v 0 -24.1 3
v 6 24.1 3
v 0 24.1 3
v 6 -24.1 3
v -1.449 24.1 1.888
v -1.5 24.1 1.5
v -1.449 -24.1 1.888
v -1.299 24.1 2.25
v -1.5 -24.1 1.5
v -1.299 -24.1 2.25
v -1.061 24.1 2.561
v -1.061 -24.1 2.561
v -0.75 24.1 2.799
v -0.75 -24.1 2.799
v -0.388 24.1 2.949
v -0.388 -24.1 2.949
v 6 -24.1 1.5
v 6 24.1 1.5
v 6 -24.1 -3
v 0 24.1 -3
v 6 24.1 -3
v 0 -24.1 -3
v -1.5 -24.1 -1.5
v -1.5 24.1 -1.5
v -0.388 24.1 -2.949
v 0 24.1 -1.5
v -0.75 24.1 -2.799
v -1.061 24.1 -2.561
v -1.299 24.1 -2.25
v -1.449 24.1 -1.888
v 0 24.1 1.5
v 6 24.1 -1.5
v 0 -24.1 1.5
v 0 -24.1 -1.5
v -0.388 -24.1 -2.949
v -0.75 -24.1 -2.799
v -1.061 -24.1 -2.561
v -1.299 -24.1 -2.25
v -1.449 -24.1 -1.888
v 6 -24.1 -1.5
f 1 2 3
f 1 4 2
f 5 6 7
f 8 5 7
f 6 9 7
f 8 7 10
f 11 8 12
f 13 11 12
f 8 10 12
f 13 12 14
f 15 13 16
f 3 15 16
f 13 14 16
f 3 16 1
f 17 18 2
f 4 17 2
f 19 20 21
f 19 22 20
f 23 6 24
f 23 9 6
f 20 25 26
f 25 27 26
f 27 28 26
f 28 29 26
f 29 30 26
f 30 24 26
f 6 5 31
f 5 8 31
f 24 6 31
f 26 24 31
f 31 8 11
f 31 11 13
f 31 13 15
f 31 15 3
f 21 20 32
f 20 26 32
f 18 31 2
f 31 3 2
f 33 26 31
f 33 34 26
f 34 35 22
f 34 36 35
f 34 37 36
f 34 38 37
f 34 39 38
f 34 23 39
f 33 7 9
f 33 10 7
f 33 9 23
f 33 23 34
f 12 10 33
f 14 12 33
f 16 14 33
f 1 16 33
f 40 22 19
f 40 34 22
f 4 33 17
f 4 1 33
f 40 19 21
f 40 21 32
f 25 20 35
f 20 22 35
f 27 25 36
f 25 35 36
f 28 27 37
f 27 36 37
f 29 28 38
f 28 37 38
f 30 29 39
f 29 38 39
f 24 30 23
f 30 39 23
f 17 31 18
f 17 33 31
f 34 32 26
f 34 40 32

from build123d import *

# Parameters (mm, degrees)
F1_DEPTH = 24.1
F2_R     = 1.5


with BuildPart() as f1:
    # F0 (on Front) → F1 (new body, symmetric)
    with BuildSketch(Plane.XZ):
        Polygon((0, 1.5), (6, 1.5), (6, 3), (-1.5, 3), (-1.5, -3), (6, -3), (6, -1.5), (0, -1.5), align=None)
    extrude(amount=F1_DEPTH, both=True)

    # F2
    f2_edges = [f1.edges().sort_by_distance(p)[0] for p in [
        (-1.5, 0, 3),
        (-1.5, 0, -3),
    ]]
    fillet(f2_edges, radius=F2_R)


solid = f1.part
